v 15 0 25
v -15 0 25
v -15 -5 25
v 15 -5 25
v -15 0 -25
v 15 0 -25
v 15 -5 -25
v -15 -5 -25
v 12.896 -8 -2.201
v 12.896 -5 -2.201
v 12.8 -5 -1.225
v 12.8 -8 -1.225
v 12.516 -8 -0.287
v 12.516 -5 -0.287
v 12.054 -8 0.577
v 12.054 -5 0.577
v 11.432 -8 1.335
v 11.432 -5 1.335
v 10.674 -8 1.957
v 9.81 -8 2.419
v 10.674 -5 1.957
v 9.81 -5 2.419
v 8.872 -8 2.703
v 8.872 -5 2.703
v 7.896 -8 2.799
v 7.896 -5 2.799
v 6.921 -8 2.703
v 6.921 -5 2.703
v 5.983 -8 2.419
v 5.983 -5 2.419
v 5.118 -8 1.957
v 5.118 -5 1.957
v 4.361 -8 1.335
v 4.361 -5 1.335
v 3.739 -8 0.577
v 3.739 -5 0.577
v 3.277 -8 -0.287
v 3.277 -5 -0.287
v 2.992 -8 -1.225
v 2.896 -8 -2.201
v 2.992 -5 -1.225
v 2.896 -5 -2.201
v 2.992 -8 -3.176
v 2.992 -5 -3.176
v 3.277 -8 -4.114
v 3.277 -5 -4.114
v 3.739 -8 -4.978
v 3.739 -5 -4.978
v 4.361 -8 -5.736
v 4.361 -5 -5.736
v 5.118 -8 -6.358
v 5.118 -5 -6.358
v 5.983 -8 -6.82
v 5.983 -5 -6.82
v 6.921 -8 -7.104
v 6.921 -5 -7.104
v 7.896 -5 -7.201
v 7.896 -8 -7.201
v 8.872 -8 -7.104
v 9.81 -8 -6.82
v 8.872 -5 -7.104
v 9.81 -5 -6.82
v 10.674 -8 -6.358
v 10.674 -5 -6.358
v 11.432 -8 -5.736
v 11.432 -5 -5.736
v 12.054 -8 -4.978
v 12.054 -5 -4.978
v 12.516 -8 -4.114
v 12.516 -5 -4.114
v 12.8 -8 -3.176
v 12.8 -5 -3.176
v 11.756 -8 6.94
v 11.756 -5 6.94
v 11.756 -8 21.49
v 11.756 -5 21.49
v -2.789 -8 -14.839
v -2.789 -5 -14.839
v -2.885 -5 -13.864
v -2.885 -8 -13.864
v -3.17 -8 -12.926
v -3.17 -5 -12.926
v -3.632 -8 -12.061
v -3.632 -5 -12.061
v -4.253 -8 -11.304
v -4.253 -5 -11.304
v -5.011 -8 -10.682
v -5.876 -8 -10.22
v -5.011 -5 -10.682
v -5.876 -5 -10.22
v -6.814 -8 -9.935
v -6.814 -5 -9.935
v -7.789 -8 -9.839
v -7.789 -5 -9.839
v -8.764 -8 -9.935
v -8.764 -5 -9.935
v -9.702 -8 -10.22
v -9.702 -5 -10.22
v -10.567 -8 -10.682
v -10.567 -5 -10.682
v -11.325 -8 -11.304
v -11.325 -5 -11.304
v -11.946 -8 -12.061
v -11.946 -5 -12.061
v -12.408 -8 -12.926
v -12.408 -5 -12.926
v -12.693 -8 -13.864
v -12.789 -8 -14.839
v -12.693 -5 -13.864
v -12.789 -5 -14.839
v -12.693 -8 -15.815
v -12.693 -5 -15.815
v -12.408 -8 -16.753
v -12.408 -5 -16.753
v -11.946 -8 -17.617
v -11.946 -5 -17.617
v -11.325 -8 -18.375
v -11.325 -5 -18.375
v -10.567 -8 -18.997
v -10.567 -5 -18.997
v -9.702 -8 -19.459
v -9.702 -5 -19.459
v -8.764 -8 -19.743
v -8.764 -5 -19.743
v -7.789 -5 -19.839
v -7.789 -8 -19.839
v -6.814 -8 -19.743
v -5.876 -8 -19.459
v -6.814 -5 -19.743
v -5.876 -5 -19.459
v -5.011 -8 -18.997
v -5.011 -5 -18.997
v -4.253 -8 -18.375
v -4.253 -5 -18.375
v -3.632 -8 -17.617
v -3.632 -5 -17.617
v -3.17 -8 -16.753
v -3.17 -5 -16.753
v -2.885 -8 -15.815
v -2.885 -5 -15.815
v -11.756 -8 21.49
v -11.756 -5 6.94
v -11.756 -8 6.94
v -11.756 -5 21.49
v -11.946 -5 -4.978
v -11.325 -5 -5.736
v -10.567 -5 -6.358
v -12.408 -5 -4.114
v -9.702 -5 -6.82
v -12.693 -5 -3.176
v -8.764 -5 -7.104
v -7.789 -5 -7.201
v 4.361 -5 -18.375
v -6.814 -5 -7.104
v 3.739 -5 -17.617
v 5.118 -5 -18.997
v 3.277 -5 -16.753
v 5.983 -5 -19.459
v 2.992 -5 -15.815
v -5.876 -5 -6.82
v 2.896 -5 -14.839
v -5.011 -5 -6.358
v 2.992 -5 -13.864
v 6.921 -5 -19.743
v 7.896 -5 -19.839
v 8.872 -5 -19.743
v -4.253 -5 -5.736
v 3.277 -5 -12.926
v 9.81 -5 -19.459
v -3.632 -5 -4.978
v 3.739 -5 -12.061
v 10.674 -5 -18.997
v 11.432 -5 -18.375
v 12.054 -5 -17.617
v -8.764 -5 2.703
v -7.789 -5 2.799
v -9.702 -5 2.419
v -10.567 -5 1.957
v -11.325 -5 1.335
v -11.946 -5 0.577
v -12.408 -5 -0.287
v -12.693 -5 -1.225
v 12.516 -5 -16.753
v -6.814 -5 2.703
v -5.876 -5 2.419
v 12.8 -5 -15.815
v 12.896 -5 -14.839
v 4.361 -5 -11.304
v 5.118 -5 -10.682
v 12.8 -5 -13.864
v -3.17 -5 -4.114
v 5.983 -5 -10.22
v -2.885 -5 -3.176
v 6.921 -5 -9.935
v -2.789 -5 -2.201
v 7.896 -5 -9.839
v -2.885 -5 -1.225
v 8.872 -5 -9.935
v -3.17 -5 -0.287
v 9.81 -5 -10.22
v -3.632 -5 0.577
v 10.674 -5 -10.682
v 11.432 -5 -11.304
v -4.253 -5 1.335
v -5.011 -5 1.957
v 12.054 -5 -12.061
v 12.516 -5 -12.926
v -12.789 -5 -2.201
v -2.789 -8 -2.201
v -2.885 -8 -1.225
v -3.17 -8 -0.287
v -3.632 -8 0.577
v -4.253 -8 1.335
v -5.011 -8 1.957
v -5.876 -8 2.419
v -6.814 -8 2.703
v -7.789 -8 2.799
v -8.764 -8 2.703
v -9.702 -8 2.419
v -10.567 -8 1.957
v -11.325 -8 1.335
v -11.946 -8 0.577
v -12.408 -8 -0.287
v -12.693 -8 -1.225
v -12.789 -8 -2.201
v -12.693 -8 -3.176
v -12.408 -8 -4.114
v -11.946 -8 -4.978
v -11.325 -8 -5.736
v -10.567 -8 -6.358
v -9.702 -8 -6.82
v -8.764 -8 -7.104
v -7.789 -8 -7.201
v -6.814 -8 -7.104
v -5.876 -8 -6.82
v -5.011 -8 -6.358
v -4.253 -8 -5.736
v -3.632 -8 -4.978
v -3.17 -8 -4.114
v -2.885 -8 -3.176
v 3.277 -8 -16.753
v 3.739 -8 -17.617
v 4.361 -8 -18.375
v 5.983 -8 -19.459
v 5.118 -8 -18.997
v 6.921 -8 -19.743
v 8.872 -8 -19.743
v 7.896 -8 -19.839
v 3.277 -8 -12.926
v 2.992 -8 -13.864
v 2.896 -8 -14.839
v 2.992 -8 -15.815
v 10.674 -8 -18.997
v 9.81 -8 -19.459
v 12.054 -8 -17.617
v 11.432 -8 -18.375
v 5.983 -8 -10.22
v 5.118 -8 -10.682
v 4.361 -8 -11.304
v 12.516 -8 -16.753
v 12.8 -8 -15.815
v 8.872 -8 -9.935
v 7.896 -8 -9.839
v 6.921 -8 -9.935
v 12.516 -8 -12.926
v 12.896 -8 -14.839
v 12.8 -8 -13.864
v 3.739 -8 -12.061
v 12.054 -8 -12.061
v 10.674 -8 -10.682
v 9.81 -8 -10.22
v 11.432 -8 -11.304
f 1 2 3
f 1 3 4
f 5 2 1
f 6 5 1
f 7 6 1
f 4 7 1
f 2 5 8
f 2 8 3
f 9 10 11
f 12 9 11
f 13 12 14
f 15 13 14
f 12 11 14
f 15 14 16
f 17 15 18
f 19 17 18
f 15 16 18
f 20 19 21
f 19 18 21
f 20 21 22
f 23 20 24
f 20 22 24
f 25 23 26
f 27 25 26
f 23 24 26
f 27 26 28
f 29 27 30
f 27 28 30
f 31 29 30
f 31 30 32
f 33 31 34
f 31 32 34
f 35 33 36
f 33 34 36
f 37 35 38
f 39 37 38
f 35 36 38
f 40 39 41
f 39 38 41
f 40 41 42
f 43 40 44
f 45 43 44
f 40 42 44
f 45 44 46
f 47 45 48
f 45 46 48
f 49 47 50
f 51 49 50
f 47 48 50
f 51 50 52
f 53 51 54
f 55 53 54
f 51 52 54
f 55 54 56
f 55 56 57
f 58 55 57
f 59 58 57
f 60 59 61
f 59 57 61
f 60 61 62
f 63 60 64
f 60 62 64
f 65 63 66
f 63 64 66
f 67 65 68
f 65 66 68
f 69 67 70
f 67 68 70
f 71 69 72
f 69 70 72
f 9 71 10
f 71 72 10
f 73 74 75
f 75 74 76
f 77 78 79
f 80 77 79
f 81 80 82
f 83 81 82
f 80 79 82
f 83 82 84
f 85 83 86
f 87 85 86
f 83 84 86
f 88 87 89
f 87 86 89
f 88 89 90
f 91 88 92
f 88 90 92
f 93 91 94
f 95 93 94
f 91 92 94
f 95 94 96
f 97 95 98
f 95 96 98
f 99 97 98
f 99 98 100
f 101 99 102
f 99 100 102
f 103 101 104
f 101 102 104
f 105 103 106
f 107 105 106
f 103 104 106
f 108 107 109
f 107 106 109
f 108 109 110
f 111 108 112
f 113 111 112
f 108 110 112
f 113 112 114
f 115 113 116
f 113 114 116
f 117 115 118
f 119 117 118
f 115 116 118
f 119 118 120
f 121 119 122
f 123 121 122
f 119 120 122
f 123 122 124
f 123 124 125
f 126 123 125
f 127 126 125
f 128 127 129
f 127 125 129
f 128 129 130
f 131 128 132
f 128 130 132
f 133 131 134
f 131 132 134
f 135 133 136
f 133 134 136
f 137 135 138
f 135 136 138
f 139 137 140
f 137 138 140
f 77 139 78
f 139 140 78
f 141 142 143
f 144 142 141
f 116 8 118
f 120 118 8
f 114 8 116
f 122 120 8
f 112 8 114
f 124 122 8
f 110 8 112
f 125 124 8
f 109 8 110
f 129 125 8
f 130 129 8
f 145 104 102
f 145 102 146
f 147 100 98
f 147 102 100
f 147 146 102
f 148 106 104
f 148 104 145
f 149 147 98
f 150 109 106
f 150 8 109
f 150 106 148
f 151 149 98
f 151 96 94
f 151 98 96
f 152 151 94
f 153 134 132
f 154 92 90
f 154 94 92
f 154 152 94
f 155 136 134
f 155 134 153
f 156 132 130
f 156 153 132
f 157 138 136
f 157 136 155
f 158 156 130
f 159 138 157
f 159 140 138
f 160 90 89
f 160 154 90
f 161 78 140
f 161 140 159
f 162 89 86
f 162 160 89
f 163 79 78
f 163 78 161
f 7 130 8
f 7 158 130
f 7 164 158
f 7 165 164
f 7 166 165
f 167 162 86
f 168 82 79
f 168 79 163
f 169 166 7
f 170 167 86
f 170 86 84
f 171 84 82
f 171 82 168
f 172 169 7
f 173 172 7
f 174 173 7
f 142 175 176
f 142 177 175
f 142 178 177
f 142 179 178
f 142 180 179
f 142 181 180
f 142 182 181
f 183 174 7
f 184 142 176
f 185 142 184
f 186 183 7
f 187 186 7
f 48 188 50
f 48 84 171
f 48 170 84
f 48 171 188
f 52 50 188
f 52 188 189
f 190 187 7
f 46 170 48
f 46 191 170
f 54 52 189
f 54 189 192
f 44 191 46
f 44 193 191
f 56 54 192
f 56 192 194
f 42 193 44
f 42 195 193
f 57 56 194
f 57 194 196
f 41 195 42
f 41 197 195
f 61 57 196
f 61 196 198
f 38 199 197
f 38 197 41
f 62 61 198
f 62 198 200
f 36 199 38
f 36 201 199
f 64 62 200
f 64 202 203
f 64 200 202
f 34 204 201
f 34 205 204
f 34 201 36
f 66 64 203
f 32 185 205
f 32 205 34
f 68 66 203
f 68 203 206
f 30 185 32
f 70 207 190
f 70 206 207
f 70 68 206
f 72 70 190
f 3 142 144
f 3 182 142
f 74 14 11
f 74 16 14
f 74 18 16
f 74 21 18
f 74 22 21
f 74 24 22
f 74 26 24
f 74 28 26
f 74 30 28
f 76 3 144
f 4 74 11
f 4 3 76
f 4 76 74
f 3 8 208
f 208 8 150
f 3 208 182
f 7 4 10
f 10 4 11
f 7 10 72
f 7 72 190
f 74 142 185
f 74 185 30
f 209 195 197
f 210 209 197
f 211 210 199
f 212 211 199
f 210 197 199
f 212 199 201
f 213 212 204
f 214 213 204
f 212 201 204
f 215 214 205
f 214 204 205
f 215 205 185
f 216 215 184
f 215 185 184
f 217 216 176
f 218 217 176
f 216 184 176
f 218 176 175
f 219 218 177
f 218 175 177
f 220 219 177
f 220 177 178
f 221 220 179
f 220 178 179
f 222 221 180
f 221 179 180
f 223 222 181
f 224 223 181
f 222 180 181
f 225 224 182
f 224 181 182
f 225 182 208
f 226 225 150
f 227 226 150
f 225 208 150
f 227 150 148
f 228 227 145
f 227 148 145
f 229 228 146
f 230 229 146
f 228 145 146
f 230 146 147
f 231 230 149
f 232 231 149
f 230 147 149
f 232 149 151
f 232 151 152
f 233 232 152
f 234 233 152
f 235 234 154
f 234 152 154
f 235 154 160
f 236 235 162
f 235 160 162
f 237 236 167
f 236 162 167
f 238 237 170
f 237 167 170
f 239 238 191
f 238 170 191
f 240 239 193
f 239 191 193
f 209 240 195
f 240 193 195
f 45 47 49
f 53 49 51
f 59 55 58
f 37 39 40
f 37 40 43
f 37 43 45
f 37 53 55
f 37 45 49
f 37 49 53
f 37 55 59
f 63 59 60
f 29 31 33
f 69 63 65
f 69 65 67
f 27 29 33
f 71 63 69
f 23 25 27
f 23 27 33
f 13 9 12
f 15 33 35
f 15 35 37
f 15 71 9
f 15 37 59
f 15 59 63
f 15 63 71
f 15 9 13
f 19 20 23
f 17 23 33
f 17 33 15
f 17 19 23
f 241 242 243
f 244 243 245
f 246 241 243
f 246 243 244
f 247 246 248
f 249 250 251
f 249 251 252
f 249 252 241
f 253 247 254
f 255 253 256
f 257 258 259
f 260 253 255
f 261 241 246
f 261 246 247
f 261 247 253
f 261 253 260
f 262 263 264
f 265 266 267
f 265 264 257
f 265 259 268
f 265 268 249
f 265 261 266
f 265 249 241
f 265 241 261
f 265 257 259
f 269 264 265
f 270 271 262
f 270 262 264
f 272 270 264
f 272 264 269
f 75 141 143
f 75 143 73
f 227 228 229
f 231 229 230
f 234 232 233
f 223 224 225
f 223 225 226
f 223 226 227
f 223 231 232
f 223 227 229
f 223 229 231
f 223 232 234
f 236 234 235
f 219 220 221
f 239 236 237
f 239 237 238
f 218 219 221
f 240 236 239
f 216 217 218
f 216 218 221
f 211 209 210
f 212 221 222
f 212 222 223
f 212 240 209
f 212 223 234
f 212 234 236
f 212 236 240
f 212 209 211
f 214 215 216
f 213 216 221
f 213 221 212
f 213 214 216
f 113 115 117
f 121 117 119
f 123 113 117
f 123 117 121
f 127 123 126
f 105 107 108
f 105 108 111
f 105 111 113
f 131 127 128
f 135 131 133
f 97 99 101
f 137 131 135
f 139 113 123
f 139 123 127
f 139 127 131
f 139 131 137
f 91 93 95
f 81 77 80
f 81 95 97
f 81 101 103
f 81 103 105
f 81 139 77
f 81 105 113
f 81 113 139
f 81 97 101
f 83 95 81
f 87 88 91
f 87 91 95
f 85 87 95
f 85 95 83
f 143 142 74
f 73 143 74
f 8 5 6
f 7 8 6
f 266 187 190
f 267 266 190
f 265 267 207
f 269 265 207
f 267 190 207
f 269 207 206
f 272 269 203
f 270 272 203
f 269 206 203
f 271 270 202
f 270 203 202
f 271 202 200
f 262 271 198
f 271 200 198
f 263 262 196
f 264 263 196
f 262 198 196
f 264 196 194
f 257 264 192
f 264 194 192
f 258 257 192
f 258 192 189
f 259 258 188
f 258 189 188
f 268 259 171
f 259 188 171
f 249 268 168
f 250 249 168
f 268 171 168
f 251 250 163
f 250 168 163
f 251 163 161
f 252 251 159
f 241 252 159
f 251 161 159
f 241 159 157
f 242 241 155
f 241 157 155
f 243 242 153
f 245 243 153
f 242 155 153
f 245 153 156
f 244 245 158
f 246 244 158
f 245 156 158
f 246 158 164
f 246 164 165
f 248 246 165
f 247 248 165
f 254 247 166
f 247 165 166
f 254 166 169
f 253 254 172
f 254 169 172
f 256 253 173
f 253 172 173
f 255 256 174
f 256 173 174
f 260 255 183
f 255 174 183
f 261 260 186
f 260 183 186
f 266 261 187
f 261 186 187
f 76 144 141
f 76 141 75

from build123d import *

# Parameters (mm, degrees)
F0_W     = 30
F0_H     = 50
F1_DEPTH = 5
F2_W     = 23.511692
F2_H     = 14.549925
F2_R     = 5
F3_DEPTH = 3


with BuildPart() as f1:
    # F0 (on Front) → F1 (new body)
    with BuildSketch(Plane.XZ):
        Rectangle(F0_W, F0_H)
    extrude(amount=F1_DEPTH)

    # F2 (on face) → F3 (join)
    with BuildSketch(Plane.XZ.offset(5)):
        with Locations((0, 14.21516)):
            Rectangle(F2_W, F2_H)
        with Locations((-7.789027, -2.200567)):
            Circle(F2_R)
        with Locations((7.896153, -2.200567)):
            Circle(F2_R)
        with Locations((-7.789027, -14.839294)):
            Circle(F2_R)
        with Locations((7.896153, -14.839294)):
            Circle(F2_R)
    extrude(amount=F3_DEPTH)


solid = f1.part
